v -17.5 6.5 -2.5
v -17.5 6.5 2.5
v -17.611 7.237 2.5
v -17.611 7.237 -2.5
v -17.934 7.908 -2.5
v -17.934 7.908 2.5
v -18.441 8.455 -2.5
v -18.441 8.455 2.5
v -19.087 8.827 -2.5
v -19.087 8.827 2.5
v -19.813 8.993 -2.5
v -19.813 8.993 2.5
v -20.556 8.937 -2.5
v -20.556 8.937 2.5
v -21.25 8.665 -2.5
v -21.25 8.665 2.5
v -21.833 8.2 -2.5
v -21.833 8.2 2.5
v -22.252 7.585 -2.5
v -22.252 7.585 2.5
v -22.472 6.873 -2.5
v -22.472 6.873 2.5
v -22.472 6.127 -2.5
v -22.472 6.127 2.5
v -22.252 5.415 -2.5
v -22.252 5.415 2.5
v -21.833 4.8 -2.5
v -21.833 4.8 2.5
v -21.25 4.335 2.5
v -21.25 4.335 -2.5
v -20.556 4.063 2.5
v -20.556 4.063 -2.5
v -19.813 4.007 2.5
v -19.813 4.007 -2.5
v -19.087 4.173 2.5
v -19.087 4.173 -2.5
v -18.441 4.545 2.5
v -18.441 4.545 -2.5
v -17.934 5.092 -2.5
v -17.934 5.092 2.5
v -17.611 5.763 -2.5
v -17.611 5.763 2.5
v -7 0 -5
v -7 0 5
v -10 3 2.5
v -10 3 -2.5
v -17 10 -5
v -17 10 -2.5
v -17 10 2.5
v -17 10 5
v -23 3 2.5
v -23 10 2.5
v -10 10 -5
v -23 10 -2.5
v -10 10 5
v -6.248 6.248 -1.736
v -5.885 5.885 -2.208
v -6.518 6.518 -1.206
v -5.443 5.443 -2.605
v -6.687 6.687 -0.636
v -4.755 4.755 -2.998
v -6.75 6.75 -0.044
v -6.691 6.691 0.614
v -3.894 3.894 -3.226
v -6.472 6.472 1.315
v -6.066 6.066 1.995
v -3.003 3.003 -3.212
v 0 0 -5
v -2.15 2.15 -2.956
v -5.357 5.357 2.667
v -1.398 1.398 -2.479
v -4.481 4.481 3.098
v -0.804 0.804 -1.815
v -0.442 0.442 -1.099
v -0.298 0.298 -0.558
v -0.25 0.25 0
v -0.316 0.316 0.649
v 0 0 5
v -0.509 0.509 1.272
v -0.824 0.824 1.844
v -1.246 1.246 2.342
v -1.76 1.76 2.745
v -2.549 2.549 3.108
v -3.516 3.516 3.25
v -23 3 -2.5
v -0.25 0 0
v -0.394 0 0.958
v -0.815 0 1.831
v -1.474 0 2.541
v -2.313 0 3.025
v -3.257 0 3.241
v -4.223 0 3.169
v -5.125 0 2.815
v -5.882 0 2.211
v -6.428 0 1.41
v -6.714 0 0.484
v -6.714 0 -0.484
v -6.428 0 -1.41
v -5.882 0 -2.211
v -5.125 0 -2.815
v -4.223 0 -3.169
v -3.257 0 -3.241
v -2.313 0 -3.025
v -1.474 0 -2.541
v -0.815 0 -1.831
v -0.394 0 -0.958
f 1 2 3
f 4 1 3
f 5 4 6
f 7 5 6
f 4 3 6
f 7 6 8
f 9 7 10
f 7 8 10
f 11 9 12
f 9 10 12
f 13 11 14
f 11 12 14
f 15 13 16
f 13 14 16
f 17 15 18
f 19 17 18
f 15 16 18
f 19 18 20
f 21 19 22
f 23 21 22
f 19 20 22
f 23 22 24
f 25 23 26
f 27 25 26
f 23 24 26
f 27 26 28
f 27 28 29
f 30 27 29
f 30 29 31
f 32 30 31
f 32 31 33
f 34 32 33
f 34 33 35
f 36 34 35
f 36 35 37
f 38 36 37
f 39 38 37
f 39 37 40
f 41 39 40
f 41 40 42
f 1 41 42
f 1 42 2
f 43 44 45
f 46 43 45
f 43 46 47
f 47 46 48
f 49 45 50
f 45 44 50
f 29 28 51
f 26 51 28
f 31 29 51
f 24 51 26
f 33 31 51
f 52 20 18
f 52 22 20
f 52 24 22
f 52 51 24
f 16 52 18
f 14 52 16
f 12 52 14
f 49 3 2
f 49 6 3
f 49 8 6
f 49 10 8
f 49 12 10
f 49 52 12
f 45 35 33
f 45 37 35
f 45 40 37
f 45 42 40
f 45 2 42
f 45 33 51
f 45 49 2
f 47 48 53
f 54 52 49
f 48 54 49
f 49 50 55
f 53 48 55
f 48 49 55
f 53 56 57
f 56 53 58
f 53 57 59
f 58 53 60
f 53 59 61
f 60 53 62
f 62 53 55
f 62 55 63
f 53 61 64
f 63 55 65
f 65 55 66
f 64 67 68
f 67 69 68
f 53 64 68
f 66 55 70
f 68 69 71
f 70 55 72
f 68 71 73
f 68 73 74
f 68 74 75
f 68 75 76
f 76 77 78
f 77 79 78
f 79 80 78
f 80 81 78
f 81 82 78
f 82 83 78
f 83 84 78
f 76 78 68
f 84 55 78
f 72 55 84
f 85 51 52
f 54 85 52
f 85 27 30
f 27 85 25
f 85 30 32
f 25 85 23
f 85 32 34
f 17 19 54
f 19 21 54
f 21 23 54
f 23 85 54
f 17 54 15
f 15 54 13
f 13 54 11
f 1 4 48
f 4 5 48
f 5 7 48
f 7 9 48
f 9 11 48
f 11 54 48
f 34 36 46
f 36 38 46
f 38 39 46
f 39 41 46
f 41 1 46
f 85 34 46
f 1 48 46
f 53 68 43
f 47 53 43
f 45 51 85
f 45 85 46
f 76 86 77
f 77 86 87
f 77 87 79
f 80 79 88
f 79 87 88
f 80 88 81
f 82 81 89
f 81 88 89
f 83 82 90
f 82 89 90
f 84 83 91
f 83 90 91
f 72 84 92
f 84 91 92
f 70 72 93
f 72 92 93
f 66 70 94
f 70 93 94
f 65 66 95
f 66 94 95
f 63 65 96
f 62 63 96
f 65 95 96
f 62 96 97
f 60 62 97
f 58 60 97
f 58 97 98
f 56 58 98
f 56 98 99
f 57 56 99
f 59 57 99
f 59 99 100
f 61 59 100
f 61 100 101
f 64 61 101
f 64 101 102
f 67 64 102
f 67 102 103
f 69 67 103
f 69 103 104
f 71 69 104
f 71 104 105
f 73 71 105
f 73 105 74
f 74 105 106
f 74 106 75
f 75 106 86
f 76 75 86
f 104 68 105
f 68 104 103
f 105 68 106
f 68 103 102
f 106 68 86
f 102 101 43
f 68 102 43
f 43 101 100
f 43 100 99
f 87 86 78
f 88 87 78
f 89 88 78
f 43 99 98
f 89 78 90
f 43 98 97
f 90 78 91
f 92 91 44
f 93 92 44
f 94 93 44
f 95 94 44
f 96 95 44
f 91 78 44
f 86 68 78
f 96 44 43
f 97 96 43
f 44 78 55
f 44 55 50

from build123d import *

# Parameters (mm, degrees)
BOSS_EXTRUDE2_DEPTH = 5
SKETCH3_R           = 3.25
CUT_EXTRUDE1_DEPTH  = 11
SKETCH4_W           = 13
SKETCH4_H           = 7
BOSS_EXTRUDE3_DEPTH = 2.5
SKETCH5_R           = 2.5
CUT_EXTRUDE2_DEPTH  = 8.5


with BuildPart() as part:
    # Sketch2 → Boss-Extrude2 (new body, symmetric)
    with BuildSketch(Plane.XY):
        Polygon((0, 0), (-7, 0), (-17, 10), (-10, 10), align=None)
    extrude(amount=BOSS_EXTRUDE2_DEPTH, both=True)

    # Sketch3 → Cut-Extrude1 (cut, through all)
    with BuildSketch(Plane.XZ):
        with Locations((-3.5, 0)):
            Circle(SKETCH3_R)
    extrude(amount=-CUT_EXTRUDE1_DEPTH, mode=Mode.SUBTRACT)

    # Sketch4 → Boss-Extrude3 (add, symmetric)
    with BuildSketch(Plane.XY):
        with Locations((-16.5, 6.5)):
            Rectangle(SKETCH4_W, SKETCH4_H)
    extrude(amount=BOSS_EXTRUDE3_DEPTH, both=True)

    # Sketch5 → Cut-Extrude2 (cut, through all)
    with BuildSketch(Plane.XY.offset(2.5)):
        with Locations((-20, 6.5)):
            Circle(SKETCH5_R)
    extrude(amount=-CUT_EXTRUDE2_DEPTH, mode=Mode.SUBTRACT)


solid = part.part
